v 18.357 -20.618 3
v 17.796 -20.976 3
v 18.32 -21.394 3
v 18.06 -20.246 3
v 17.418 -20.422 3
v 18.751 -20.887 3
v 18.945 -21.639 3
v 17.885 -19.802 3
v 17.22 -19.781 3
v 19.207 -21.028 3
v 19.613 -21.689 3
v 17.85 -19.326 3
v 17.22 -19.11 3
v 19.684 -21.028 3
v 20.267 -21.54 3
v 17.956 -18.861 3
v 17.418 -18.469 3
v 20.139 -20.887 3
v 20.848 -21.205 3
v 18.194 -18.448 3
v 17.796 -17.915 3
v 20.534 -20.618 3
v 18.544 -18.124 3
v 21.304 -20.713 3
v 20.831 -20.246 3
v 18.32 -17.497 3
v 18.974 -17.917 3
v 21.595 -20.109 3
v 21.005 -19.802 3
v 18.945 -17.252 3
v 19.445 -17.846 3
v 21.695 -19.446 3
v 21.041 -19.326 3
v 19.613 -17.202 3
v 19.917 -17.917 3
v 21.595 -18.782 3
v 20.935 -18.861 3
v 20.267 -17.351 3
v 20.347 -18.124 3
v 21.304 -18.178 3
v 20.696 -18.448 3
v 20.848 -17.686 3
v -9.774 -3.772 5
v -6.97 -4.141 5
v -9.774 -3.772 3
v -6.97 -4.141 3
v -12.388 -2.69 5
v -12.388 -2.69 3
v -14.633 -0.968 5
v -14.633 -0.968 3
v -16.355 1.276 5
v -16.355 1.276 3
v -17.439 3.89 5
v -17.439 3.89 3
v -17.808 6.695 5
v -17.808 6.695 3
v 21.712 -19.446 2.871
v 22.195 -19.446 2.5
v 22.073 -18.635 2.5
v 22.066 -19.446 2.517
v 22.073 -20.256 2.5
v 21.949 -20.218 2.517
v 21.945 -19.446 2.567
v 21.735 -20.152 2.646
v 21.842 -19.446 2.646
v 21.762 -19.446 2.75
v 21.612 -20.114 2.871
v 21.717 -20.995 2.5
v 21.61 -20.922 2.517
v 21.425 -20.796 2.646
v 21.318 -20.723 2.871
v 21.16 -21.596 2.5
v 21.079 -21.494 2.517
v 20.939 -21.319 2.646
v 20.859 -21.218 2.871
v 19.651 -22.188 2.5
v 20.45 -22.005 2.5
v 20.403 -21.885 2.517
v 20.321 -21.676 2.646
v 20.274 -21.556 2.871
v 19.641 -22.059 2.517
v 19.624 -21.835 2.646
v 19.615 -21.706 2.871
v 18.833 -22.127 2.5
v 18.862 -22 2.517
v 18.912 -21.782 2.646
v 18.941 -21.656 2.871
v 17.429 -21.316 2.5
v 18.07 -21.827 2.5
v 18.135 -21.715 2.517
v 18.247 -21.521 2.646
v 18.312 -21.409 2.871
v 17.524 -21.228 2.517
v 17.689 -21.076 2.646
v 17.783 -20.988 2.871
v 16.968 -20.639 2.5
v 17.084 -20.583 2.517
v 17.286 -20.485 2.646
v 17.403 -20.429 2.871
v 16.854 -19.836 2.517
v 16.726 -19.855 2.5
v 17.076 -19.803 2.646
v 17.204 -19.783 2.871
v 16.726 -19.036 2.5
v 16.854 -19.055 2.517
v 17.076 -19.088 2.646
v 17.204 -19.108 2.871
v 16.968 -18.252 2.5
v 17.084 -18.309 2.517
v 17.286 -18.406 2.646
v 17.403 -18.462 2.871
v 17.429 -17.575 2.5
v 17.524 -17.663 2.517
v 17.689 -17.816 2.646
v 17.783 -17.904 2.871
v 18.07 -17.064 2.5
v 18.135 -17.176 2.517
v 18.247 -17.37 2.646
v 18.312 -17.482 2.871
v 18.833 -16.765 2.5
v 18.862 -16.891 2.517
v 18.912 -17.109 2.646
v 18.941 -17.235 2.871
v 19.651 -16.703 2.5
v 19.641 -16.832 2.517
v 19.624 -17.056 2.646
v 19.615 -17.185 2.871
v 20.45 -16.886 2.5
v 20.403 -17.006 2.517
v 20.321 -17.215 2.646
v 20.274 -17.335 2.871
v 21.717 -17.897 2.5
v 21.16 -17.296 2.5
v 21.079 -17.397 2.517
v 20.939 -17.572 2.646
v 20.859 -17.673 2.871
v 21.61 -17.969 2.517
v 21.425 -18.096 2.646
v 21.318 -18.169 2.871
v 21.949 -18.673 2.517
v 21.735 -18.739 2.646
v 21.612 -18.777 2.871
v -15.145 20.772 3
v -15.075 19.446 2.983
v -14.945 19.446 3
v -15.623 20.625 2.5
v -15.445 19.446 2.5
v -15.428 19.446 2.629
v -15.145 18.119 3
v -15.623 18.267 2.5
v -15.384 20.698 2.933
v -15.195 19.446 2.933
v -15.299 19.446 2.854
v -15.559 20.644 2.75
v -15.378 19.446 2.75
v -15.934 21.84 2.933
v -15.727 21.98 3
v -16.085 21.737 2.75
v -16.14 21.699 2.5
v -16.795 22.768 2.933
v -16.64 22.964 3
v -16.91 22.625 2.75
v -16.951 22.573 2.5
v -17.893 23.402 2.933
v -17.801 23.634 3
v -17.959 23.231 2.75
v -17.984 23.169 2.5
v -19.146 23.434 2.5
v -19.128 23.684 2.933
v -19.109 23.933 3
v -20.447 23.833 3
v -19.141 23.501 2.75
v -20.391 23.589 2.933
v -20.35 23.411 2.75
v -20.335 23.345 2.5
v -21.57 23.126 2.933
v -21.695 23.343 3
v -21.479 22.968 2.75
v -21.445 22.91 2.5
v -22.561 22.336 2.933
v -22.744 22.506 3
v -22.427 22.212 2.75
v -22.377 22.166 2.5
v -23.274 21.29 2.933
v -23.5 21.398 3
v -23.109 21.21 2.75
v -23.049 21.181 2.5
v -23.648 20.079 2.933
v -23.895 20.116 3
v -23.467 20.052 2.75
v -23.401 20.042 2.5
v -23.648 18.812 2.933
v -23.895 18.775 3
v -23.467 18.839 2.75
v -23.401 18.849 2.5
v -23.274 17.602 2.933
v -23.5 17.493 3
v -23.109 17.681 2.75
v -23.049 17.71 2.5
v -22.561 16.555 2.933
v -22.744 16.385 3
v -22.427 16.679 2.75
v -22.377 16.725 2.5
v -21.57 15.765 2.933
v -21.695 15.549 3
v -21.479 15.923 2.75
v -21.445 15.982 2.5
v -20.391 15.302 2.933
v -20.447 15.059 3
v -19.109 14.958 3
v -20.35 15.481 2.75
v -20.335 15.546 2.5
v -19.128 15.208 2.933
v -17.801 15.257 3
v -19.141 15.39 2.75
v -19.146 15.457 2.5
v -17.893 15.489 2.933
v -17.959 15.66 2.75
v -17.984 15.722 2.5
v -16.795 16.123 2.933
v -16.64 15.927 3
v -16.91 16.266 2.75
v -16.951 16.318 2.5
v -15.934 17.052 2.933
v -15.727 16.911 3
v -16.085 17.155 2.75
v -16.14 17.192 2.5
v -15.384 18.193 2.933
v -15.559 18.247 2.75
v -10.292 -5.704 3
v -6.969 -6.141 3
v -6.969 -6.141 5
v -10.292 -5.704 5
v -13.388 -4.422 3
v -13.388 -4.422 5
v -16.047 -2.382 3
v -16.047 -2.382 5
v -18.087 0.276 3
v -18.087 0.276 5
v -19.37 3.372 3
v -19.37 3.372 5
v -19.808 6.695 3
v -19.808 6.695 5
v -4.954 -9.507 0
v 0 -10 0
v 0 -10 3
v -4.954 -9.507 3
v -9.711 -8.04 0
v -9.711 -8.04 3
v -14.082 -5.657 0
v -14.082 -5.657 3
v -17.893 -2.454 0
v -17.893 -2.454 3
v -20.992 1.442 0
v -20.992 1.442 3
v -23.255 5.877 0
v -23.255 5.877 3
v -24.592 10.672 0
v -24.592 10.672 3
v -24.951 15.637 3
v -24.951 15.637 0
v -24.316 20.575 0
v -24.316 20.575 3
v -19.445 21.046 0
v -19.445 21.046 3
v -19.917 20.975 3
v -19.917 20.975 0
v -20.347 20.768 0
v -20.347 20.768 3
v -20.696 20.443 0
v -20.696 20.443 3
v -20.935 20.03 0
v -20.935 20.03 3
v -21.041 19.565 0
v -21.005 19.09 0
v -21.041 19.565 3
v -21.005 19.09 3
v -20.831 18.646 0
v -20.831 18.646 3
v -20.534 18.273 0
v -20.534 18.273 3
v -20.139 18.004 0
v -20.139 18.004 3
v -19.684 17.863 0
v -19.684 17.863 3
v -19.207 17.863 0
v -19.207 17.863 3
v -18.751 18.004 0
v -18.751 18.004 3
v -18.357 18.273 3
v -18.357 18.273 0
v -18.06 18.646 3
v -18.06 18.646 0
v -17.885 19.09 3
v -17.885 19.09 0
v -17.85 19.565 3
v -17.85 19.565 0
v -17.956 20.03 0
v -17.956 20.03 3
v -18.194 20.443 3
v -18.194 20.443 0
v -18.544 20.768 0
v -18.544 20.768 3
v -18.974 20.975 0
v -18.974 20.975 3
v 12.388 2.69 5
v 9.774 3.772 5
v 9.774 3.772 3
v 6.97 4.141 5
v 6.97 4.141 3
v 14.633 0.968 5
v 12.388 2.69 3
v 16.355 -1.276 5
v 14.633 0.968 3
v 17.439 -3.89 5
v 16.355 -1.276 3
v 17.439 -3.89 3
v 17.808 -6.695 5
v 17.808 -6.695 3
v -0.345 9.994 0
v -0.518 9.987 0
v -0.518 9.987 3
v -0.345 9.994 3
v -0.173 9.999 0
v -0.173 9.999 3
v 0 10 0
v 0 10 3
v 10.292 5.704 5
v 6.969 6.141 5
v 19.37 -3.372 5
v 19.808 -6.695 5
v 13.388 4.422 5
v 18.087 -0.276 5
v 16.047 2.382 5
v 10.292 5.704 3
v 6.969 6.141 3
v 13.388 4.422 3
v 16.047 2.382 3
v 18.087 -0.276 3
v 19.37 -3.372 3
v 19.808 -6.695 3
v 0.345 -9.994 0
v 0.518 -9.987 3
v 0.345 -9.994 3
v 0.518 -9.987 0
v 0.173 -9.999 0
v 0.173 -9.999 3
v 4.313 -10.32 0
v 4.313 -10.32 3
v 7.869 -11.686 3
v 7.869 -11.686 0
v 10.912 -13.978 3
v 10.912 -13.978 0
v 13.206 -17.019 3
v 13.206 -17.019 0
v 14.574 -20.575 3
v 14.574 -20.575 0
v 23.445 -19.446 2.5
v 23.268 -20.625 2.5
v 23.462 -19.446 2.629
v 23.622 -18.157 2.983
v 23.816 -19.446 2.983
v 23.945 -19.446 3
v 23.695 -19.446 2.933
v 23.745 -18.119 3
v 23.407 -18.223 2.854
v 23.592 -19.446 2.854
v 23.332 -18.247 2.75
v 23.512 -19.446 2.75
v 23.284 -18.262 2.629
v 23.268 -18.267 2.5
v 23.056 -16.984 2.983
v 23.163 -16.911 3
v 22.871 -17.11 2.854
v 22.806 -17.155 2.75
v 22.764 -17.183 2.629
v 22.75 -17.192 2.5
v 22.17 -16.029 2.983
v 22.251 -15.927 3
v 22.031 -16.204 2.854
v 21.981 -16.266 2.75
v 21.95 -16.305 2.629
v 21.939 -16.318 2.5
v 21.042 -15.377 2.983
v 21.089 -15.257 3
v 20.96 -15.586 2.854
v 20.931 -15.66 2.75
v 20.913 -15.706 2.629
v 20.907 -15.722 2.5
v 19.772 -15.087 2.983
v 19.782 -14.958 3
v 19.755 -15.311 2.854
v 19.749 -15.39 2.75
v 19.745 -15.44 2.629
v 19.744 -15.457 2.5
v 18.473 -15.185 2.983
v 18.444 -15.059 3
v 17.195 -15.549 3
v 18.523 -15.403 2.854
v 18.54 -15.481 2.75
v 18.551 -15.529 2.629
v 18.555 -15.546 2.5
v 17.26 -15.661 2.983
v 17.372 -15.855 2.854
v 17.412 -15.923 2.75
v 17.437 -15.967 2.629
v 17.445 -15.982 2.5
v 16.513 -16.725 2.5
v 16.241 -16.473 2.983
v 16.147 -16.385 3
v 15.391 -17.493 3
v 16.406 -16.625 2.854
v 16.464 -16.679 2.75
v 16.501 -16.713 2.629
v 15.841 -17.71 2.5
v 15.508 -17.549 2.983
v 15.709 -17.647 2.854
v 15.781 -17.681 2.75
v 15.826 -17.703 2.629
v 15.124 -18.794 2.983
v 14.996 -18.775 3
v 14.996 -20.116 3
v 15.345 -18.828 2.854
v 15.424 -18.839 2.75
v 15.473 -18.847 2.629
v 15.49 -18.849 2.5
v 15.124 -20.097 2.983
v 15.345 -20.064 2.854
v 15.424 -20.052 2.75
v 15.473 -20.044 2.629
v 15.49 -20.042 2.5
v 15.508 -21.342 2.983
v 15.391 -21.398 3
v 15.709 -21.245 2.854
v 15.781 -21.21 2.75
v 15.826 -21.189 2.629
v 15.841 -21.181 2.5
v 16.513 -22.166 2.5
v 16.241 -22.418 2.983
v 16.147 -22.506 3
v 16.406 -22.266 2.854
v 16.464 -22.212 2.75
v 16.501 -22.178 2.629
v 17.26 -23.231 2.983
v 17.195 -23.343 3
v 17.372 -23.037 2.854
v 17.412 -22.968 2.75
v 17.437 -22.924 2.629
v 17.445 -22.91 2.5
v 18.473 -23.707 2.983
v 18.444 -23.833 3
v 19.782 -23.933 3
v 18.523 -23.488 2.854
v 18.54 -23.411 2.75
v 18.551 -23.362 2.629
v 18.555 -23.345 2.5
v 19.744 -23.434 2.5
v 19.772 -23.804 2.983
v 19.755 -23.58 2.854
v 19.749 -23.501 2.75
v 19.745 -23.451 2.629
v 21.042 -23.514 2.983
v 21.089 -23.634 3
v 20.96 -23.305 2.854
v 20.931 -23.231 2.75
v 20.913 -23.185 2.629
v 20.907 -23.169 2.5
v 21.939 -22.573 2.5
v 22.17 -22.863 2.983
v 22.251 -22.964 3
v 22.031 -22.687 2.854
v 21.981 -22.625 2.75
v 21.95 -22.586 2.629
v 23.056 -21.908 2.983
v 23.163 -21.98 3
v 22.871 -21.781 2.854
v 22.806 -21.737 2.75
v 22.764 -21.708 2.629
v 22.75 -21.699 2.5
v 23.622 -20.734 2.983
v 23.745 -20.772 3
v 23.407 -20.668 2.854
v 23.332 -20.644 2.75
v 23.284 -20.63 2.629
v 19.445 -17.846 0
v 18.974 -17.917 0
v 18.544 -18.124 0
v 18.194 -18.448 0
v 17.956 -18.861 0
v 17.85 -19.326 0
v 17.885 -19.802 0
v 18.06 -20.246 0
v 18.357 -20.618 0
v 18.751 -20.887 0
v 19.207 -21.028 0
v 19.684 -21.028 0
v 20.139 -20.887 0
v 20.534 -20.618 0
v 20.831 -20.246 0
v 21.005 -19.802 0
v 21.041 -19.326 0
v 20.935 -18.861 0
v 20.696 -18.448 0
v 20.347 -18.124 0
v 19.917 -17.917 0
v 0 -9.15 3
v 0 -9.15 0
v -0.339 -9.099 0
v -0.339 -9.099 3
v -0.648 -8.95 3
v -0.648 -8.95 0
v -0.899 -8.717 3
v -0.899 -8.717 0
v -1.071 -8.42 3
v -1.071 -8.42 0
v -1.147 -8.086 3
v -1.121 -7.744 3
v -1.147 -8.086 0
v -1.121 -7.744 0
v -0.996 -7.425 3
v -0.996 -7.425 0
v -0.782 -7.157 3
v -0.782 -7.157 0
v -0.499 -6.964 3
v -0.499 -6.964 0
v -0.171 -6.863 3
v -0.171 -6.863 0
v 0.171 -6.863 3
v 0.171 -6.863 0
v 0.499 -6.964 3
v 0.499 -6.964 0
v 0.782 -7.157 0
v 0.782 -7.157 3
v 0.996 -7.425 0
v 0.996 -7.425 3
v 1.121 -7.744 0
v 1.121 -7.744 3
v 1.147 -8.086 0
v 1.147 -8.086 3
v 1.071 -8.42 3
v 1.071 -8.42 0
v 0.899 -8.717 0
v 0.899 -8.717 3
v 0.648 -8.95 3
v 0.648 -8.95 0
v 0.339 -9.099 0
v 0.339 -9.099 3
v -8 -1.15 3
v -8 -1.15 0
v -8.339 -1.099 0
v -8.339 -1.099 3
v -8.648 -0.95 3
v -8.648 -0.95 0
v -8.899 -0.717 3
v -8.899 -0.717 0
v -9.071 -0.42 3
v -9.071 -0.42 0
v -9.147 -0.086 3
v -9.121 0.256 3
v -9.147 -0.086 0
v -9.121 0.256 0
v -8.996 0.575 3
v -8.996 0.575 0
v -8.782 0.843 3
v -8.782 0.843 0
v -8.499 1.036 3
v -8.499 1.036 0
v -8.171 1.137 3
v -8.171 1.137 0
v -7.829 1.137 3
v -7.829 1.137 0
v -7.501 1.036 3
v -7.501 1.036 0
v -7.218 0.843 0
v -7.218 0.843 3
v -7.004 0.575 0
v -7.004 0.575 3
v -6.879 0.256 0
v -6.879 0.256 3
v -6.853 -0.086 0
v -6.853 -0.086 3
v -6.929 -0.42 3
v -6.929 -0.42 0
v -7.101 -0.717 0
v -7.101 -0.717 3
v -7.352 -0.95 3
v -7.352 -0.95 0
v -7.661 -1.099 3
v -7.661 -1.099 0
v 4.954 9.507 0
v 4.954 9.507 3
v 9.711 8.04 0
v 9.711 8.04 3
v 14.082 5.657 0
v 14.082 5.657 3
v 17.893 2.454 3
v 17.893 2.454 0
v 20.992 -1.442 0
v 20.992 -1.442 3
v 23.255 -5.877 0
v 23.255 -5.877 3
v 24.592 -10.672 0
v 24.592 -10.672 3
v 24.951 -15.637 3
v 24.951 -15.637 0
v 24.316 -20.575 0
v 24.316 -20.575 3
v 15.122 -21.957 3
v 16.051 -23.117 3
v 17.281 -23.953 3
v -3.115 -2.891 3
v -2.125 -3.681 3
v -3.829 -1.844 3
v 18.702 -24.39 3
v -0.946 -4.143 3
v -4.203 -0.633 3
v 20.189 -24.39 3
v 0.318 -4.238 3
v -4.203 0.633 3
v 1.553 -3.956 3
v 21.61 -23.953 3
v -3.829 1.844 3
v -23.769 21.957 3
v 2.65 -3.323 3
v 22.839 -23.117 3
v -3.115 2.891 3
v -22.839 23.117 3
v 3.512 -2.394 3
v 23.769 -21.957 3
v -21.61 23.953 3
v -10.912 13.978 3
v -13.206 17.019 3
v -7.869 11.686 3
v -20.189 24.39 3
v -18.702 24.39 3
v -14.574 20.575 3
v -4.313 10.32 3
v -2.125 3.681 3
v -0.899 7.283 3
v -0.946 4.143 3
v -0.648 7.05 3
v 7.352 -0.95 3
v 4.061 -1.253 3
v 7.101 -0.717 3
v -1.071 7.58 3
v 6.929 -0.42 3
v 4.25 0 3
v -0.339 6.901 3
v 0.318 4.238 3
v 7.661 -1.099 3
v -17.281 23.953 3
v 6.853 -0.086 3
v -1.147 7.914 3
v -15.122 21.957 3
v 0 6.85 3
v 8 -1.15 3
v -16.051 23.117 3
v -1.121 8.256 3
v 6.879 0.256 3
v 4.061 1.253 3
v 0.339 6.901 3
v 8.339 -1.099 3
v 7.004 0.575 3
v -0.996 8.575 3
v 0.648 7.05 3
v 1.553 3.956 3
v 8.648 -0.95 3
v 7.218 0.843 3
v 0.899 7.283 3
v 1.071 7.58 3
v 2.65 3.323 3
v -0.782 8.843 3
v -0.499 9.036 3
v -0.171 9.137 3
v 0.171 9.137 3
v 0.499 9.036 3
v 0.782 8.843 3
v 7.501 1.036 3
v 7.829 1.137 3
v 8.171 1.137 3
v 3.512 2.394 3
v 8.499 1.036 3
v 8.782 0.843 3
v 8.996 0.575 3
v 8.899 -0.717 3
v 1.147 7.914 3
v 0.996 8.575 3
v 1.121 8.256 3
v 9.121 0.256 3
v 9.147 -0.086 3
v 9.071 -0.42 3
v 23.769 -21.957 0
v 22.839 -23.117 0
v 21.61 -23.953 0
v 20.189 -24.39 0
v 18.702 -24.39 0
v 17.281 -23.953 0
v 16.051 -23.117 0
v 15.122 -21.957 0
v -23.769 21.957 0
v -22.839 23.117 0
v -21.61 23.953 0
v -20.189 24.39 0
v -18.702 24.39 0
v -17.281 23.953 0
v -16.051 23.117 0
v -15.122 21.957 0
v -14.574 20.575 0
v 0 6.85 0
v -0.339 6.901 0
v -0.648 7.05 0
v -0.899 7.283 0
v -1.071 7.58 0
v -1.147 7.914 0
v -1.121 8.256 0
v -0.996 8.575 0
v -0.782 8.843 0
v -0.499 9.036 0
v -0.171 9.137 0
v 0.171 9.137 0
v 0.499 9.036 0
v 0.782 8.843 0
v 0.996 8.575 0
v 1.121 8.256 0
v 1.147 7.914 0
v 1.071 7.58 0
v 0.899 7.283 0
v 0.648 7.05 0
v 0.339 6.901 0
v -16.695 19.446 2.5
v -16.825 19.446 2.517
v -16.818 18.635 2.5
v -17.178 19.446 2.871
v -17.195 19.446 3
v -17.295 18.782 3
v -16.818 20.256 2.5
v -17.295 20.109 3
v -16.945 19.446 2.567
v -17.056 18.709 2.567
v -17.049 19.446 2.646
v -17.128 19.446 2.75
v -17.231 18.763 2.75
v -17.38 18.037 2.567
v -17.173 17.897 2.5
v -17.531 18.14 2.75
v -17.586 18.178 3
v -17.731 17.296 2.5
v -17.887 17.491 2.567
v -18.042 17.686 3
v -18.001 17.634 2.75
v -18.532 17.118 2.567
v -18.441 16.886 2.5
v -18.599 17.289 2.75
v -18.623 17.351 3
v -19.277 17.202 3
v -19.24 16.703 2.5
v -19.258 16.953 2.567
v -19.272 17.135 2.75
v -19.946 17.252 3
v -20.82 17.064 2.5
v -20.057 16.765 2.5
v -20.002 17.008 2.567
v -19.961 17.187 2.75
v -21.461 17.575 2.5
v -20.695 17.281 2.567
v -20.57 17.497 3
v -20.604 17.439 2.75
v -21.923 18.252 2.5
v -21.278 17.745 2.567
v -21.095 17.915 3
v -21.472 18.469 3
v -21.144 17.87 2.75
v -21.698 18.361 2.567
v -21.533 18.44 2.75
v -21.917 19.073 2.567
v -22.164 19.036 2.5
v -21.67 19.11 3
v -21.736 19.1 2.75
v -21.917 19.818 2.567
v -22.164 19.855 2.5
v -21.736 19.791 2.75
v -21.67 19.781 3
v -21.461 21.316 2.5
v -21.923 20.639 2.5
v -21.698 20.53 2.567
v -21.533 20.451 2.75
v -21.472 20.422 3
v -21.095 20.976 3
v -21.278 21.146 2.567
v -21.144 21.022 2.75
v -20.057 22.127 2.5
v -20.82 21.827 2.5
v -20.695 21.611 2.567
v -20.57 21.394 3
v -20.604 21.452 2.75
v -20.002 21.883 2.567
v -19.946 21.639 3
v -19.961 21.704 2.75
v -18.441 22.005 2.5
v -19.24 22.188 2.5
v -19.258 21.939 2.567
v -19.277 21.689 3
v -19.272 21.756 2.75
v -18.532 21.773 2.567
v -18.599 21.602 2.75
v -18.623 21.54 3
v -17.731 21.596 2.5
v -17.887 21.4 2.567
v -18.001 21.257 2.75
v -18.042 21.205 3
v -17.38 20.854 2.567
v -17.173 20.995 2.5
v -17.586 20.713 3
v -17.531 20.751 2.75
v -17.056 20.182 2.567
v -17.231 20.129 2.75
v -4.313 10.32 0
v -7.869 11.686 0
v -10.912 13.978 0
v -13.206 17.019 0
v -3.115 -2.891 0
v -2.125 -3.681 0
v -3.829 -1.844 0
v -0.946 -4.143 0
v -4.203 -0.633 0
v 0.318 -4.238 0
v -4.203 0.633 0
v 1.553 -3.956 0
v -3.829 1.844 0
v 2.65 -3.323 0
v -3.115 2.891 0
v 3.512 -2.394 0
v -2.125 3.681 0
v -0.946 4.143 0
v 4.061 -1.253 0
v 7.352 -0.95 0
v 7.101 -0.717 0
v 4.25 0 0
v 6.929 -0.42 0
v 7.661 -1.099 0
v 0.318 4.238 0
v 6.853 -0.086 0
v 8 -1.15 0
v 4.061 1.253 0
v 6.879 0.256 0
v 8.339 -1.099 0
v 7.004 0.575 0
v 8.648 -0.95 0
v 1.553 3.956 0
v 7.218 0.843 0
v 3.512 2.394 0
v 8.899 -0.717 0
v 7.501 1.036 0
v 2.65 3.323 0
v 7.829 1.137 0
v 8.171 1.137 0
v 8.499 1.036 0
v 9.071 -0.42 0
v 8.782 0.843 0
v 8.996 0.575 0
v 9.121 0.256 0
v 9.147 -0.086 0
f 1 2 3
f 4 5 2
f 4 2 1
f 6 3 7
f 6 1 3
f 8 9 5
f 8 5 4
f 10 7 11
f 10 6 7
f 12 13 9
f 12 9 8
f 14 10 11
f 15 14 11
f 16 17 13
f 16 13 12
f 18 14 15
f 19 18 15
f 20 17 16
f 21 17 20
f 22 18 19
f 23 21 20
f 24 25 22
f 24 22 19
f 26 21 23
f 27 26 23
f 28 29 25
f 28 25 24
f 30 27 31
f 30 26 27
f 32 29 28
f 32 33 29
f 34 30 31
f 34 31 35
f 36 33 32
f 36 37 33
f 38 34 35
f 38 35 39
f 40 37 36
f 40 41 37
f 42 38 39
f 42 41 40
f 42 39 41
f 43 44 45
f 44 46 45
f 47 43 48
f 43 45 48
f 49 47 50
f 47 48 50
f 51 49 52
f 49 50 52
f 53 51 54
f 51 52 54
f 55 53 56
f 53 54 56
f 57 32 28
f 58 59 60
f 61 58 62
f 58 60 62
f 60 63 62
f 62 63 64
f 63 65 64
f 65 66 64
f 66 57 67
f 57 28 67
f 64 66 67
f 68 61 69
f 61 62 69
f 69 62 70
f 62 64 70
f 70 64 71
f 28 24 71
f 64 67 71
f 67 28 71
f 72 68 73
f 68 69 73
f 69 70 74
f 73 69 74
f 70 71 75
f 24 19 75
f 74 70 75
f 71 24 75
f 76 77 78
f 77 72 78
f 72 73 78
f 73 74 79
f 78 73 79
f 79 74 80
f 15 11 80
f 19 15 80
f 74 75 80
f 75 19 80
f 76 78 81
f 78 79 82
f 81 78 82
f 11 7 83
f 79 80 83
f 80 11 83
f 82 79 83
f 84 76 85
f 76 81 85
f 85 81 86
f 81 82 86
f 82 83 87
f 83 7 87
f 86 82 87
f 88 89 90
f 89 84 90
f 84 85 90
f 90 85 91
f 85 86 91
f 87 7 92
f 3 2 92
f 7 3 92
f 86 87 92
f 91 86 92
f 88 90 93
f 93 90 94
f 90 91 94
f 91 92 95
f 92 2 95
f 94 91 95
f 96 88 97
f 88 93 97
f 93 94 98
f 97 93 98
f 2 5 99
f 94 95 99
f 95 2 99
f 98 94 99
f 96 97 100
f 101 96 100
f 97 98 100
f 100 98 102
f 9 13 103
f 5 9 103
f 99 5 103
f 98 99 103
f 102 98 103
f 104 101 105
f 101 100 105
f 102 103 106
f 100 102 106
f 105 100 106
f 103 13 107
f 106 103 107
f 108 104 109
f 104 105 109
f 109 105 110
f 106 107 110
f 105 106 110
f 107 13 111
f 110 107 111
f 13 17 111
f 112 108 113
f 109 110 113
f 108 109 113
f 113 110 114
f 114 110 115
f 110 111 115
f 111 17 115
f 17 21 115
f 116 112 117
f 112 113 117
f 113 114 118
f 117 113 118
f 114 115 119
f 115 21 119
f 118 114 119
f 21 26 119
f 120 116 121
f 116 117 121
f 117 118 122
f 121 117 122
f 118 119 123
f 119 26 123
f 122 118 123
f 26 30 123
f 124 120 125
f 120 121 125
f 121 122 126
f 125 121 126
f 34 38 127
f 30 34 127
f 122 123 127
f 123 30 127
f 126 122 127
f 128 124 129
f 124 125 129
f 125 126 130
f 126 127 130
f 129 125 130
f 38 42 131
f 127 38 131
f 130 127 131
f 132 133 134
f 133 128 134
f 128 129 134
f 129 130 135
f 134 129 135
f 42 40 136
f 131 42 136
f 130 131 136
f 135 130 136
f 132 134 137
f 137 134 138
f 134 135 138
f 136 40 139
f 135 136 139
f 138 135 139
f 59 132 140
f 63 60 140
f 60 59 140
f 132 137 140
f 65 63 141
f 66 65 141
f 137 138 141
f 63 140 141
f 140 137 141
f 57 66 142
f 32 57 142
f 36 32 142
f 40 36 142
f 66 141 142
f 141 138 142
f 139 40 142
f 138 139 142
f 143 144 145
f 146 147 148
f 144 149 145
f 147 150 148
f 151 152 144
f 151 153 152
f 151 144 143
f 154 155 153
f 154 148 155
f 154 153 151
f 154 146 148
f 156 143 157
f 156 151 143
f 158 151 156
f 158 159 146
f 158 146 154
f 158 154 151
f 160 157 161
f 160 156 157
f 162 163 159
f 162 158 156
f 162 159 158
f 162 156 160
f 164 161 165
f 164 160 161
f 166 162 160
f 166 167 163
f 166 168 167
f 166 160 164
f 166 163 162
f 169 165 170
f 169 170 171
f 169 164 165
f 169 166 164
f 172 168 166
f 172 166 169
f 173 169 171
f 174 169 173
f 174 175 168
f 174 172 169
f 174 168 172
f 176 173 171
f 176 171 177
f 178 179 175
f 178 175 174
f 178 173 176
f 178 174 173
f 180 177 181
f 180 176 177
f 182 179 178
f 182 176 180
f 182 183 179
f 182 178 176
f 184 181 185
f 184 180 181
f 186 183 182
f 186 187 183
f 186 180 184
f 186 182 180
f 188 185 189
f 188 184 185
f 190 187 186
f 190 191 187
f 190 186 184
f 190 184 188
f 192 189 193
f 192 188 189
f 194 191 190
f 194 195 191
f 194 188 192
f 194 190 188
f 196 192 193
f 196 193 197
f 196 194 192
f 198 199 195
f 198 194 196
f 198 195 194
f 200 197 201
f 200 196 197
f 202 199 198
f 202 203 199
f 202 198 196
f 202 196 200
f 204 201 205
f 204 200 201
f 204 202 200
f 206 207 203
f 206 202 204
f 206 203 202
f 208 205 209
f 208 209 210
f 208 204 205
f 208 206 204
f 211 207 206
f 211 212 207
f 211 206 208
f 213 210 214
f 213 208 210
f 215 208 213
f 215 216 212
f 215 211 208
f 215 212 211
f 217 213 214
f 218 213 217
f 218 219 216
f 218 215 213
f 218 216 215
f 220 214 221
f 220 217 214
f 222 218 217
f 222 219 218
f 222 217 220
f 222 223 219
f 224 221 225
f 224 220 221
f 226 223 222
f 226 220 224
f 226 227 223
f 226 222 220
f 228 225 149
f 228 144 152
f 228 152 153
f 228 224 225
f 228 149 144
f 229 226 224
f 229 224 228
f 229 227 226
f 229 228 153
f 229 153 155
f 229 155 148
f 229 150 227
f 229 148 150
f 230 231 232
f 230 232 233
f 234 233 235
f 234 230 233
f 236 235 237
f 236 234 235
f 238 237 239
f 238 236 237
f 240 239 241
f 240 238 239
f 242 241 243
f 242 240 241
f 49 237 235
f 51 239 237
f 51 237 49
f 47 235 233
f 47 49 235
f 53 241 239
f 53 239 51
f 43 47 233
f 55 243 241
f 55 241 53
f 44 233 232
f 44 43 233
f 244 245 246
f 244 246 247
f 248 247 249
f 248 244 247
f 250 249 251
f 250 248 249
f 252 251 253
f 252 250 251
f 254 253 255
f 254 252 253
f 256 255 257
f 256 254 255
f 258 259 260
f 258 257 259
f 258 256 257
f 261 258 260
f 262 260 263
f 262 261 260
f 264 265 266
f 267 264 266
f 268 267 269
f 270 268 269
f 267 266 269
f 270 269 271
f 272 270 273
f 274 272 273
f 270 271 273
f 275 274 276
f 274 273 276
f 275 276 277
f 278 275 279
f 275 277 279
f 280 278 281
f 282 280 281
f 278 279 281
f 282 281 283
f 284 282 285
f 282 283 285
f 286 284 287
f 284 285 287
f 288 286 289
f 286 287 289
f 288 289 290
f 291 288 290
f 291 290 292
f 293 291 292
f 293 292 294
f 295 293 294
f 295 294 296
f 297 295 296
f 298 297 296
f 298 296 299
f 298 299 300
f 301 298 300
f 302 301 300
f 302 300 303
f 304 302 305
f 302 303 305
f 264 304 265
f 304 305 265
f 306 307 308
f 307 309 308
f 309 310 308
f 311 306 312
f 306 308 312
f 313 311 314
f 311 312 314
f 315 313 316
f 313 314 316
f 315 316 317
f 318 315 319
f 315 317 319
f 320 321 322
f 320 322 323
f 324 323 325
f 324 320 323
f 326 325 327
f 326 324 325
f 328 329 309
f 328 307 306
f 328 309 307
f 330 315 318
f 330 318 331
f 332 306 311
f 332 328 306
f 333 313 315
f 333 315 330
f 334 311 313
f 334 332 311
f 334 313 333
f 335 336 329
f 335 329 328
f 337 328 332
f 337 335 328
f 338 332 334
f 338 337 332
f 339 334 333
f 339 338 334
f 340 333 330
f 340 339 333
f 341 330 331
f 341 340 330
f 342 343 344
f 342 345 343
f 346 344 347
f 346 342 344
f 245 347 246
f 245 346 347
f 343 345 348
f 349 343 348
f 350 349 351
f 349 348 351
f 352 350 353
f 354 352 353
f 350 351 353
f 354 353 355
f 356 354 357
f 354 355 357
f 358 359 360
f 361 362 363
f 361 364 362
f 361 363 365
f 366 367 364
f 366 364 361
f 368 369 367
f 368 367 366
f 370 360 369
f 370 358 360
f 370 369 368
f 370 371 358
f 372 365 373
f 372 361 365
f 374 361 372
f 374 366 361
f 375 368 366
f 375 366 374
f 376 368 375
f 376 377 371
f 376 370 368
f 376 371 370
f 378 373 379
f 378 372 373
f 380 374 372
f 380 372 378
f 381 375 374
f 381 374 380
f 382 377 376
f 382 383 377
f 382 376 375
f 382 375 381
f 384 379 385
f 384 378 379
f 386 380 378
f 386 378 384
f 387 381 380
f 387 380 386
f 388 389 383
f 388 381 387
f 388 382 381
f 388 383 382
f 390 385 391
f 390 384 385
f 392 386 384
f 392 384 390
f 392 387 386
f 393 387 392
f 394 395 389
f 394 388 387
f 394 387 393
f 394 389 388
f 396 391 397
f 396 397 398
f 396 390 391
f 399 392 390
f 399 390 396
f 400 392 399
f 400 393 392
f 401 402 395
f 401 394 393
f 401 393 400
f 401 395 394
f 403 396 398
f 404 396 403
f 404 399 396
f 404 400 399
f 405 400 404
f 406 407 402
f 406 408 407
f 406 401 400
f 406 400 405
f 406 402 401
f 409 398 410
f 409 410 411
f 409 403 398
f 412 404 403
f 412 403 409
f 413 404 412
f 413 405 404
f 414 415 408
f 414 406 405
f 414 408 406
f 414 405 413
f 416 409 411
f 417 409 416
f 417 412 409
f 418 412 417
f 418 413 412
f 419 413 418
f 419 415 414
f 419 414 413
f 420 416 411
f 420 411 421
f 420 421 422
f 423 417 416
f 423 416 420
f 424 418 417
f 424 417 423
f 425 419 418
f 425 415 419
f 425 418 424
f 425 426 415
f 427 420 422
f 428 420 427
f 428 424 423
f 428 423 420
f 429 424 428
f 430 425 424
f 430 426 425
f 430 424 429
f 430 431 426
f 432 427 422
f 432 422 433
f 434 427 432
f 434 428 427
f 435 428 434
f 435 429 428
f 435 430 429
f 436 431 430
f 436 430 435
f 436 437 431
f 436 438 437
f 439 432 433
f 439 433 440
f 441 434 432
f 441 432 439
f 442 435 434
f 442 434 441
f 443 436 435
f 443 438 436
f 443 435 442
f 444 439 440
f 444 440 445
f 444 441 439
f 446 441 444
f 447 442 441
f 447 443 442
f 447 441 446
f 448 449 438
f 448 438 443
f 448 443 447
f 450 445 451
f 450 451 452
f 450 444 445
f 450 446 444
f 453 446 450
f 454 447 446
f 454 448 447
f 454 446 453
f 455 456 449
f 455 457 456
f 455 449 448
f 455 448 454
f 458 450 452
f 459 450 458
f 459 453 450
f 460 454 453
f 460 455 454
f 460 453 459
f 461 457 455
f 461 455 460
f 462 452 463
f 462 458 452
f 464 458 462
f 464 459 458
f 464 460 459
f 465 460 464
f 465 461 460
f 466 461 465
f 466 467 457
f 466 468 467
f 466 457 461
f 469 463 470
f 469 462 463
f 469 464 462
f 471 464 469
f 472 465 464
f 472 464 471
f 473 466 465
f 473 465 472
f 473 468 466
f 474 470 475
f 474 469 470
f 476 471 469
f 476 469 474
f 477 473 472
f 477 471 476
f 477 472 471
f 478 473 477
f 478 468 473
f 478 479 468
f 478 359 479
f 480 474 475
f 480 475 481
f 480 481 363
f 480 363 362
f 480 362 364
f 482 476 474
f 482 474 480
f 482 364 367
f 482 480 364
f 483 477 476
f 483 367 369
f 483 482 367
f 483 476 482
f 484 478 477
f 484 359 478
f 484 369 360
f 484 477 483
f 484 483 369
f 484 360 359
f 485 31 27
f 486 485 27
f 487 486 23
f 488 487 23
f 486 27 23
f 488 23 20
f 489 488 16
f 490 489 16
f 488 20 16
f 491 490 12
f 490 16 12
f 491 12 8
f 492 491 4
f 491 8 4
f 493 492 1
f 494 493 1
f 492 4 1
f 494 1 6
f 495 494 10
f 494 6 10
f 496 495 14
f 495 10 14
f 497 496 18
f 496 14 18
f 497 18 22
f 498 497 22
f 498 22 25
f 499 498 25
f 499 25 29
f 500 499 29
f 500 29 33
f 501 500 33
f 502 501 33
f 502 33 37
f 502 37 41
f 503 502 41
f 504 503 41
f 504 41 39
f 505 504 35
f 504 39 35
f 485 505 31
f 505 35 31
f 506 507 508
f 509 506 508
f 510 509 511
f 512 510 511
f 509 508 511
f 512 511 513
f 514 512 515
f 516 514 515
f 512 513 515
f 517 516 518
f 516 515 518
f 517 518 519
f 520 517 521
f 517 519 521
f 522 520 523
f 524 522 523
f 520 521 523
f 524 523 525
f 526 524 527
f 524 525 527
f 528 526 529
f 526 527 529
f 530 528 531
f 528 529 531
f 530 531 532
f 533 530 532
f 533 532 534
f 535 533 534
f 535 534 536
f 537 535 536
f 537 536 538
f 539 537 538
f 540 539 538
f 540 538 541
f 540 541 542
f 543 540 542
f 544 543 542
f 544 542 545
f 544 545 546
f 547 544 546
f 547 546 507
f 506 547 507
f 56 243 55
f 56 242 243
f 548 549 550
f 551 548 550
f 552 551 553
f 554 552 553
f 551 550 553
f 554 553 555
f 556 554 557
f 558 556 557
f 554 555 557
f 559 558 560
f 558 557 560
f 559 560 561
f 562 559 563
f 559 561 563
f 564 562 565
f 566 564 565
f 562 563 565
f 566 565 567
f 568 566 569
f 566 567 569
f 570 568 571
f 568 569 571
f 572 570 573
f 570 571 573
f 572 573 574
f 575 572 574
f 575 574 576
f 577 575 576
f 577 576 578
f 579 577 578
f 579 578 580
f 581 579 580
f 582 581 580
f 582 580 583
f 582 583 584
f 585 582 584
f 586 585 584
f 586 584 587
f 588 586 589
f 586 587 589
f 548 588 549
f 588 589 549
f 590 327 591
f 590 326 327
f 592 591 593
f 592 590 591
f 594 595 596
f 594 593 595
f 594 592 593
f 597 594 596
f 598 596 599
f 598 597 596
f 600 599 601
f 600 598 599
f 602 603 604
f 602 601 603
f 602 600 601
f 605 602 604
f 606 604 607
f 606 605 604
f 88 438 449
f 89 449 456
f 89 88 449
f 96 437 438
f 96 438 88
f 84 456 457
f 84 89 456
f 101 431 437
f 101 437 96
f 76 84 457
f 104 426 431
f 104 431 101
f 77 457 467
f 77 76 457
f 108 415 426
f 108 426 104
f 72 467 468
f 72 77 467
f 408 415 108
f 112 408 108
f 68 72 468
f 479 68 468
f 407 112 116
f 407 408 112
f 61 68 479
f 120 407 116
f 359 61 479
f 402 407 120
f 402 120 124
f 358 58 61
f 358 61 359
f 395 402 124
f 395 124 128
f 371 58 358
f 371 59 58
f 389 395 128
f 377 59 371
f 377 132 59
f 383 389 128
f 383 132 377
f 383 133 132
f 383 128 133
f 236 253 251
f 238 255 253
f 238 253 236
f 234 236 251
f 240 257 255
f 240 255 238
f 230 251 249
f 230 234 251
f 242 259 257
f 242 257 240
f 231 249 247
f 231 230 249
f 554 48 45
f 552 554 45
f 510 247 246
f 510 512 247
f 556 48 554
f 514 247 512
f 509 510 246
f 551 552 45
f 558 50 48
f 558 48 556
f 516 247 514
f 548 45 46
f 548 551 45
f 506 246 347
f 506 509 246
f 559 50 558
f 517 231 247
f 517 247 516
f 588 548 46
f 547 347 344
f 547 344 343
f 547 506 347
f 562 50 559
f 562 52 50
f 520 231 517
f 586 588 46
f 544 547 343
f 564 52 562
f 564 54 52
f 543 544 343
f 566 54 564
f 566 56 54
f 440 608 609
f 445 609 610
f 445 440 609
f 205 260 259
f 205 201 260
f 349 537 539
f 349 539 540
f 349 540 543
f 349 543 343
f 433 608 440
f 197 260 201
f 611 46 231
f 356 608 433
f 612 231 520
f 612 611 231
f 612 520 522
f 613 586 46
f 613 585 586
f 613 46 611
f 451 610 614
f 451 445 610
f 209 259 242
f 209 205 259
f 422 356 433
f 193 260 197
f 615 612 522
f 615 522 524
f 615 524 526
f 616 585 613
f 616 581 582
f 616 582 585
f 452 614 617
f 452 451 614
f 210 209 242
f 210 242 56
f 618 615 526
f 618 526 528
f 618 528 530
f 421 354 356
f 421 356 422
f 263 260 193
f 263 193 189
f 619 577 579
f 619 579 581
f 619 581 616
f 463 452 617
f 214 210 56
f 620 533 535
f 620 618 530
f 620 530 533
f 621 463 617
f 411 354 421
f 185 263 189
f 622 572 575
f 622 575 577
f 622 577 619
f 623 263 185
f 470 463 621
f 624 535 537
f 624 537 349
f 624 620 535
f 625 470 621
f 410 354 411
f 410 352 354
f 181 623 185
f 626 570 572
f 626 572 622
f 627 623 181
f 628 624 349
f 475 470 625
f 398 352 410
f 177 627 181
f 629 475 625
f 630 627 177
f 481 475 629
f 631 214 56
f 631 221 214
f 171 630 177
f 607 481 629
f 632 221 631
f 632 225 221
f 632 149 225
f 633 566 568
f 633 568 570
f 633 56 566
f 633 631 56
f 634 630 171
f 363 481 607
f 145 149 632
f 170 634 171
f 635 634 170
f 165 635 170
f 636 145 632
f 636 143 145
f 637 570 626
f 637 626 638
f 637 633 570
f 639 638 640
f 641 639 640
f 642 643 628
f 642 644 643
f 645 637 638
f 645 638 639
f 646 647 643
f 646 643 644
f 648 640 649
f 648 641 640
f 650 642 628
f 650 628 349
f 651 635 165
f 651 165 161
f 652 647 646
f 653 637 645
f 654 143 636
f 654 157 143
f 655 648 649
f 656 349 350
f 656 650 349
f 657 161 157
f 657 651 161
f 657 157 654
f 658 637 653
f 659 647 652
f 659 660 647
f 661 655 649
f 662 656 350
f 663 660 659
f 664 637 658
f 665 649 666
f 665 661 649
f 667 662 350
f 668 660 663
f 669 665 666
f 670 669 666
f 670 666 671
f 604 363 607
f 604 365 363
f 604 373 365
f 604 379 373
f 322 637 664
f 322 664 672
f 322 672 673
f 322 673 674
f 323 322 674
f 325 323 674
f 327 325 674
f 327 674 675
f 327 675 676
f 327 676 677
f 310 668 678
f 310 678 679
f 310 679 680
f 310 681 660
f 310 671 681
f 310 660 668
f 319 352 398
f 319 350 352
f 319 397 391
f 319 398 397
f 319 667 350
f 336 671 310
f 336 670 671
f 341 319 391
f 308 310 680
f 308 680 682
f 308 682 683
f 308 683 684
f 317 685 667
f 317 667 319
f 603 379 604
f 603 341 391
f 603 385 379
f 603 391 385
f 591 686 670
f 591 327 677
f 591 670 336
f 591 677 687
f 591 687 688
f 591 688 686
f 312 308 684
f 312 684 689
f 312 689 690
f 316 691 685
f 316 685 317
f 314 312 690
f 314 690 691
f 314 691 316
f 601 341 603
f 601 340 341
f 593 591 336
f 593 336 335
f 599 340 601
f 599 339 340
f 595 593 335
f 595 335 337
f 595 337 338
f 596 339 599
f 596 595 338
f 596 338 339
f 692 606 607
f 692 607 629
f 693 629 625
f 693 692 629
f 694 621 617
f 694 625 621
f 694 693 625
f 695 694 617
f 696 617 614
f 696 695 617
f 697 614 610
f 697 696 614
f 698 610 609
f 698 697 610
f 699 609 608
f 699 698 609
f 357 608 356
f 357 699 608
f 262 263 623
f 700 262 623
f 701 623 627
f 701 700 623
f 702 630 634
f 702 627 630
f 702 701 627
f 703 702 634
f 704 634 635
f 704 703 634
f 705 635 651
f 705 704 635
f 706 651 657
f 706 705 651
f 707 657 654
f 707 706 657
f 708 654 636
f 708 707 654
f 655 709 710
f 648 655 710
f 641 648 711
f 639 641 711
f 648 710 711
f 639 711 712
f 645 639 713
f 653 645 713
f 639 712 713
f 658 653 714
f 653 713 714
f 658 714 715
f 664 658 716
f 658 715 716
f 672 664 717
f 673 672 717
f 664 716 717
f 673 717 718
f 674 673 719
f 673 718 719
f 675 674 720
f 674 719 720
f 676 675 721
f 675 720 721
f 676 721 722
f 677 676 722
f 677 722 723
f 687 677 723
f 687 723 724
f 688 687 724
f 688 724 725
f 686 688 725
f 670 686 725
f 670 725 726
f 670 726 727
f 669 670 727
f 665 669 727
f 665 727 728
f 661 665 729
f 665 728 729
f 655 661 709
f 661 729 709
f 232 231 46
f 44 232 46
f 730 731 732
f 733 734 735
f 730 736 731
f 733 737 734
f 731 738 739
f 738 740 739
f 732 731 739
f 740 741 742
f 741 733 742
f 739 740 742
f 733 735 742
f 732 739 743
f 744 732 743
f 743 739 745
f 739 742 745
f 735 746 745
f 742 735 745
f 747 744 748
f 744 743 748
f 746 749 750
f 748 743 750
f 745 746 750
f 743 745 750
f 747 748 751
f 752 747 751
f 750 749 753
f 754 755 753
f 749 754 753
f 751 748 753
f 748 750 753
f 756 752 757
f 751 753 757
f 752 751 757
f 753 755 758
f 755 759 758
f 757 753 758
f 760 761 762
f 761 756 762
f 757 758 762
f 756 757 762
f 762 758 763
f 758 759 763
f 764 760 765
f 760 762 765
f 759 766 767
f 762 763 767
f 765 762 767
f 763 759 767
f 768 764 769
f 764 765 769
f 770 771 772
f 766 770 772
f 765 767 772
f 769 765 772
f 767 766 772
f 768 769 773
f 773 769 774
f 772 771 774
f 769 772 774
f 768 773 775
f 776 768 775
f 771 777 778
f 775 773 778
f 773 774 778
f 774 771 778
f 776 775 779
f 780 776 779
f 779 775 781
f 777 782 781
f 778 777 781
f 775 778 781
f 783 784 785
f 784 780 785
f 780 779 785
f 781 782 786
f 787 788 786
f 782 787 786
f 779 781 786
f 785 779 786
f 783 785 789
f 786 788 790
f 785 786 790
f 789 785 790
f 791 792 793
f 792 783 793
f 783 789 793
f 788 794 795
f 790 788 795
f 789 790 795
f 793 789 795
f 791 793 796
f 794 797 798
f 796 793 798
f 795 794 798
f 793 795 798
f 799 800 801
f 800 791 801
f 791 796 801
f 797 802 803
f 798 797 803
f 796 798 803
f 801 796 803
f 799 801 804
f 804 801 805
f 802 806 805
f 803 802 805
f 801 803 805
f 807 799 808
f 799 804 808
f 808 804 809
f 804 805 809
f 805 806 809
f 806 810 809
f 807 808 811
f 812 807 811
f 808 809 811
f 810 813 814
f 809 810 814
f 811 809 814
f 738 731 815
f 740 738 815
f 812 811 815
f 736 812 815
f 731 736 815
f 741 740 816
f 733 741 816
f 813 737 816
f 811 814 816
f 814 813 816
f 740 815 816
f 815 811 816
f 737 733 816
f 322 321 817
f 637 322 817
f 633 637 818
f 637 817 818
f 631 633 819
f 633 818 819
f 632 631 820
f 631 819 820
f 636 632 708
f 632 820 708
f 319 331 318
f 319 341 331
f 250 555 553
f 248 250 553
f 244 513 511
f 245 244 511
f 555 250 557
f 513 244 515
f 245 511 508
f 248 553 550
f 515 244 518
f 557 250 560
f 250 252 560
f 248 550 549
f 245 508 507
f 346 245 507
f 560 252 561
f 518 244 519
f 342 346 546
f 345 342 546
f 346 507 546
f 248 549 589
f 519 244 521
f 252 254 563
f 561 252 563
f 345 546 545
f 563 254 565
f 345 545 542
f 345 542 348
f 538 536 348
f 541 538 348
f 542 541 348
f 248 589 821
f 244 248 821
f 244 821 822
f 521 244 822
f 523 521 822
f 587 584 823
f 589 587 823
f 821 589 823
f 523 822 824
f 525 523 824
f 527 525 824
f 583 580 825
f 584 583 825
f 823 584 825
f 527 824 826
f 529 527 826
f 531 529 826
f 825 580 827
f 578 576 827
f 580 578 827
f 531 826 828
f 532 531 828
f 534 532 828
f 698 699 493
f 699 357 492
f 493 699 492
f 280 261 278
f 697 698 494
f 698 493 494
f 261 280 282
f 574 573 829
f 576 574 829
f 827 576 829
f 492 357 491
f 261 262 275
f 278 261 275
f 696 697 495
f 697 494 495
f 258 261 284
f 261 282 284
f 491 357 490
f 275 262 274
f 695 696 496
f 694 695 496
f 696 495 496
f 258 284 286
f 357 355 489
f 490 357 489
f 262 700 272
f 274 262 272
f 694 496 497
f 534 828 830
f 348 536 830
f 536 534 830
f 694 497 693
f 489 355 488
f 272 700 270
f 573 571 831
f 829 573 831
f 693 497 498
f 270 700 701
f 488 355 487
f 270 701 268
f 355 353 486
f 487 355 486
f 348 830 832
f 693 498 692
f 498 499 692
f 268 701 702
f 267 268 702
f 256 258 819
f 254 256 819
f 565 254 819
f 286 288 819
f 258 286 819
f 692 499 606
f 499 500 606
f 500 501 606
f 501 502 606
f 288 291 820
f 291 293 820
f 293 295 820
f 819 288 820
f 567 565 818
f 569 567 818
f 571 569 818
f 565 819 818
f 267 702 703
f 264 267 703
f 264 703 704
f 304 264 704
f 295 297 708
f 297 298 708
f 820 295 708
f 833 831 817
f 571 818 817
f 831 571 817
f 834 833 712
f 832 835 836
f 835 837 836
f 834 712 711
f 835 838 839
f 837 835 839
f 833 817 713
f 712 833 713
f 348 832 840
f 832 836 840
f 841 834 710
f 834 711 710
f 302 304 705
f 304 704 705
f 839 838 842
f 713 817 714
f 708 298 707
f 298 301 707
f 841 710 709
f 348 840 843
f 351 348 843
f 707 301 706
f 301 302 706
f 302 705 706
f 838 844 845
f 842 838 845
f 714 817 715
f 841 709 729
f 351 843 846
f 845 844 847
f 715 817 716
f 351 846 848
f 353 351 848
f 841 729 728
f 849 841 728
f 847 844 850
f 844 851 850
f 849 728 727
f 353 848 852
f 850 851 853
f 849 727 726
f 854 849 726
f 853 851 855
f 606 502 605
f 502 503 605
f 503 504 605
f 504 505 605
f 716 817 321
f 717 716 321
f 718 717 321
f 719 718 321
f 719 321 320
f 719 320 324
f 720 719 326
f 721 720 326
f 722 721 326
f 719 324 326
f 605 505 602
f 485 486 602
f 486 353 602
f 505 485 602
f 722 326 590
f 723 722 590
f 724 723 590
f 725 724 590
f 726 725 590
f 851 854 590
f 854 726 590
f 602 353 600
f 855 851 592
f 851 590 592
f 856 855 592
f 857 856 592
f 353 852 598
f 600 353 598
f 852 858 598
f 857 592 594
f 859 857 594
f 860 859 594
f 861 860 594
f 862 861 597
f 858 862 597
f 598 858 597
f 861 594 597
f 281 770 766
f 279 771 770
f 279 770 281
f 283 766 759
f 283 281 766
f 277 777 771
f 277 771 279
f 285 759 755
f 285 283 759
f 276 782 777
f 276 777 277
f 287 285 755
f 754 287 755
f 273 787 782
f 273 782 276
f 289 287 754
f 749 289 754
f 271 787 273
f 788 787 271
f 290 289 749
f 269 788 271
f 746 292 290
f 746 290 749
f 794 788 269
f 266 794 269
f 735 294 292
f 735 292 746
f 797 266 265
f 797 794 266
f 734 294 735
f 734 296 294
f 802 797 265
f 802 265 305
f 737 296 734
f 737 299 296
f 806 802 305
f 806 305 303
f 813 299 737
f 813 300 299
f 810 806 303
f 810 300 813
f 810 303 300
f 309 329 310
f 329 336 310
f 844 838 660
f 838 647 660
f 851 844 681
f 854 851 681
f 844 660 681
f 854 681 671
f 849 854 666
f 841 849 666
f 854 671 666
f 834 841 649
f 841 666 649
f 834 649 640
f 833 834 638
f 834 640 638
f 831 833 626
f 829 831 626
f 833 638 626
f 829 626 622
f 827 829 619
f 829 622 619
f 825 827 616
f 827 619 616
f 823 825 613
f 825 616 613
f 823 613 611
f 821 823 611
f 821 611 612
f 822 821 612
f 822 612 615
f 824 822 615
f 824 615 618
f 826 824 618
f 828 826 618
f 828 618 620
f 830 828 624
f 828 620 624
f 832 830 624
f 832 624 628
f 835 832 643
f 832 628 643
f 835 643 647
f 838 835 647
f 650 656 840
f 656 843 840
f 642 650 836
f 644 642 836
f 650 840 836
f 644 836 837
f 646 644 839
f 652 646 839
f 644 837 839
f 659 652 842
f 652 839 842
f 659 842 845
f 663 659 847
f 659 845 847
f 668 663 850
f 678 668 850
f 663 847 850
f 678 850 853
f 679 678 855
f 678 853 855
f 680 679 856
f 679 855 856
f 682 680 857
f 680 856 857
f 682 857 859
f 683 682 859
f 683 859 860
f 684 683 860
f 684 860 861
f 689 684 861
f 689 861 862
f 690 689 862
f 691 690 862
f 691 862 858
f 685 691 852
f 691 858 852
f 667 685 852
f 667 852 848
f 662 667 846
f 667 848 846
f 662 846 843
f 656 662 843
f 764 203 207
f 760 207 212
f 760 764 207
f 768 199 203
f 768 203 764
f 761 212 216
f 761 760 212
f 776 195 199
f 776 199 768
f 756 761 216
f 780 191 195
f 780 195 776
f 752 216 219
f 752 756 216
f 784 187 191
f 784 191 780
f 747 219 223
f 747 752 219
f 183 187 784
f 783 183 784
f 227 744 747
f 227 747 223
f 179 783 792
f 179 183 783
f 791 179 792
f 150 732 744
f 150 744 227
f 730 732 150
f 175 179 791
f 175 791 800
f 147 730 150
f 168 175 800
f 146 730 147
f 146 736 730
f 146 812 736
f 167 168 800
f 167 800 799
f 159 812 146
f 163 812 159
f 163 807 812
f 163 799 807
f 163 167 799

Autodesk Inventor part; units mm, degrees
ref_plane "YZ Plane" through (0, 0, 0) normal (1, 0, 0) x (0, 1, 0)
ref_plane "XZ Plane" through (0, 0, 0) normal (0, 1, 0) x (-1, 0, 0)
ref_plane "XY Plane" through (0, 0, 0) normal (0, 0, 1) x (1, 0, 0)
sketch "スケッチ1" plane through (0, 0, 0) normal (0, 0, 1) x (1, 0, 0)
  circle A0 centre (0, 0) radius 27.5
  line L0 (0, 27.5) -> (0, 0)
  line L1 (8, 0) -> (19.445271, -19.445602)
  line L2 (0, 0) -> (27.5, 0)
  circle A1 centre (19.445271, -19.445602) radius 5
  circle A2 centre (0, 0) radius 10
  arc A3 (24.316088, -20.574825) -> (0, 10.000005) centre (0.018653, -14.941839) ccw
  line L3 (24.316088, -20.574825) -> (14.574455, -20.574825)
  arc A4 (14.574455, -20.574825) -> (0.517924, -9.986579) centre (1.227526, -23.669106) ccw
  arc A5 (-24.316088, 20.574825) -> (0, -10.000005) centre (-0.018653, 14.941839) ccw
  arc A6 (-14.574455, 20.574825) -> (-0.517924, 9.986579) centre (-1.227526, 23.669106) ccw
  circle A7 centre (-19.445271, 19.445602) radius 5
  point P0 (-0.517924, 9.986579)
  point P1 (0, -10)
  point P2 (0, 10.000005)
  dimension "d4" = 20
  dimension "d0" = 55
  dimension "d1" = 8
  dimension "d2" = 22.56381
  dimension "d3" = 10
  dimension "d5" = 9.74163
  dimension "d9" = 360
sketch "スケッチ1 outline for 押し出し1" plane through (0, 0, 0) normal (0, 0, 1) x (1, 0, 0)
  arc A0 (14.574455, -20.574825) -> (24.316088, -20.574825) centre (19.445271, -19.445602) ccw
  arc A1 (24.316088, -20.574825) -> (0, 10.000005) centre (0.018653, -14.941839) ccw
  arc A2 (0, 10) -> (-0.517924, 9.986579) centre (0, 0) ccw
  arc A3 (-0.517924, 9.986579) -> (-14.574455, 20.574825) centre (-1.227526, 23.669106) cw
  arc A4 (-14.574455, 20.574825) -> (-24.316088, 20.574825) centre (-19.445271, 19.445602) ccw
  arc A5 (-24.316088, 20.574825) -> (0, -10) centre (-0.018659, 14.941837) ccw
  arc A6 (0, -10) -> (0.517924, -9.986579) centre (0, 0) ccw
  arc A7 (0.517924, -9.986579) -> (14.574455, -20.574825) centre (1.227526, -23.669106) cw
extrude "押し出し1" add sketch "スケッチ1 outline for 押し出し1" along normal blind 3
sketch "スケッチ2" plane through (0, 0, 3) normal (0, 0, 1) x (1, 0, 0)
  circle A0 centre (0, 0) radius 4.25
  dimension "d13" = 8.5
extrude "押し出し2" cut sketch "スケッチ2" against normal blind 3
sketch "スケッチ3" plane through (0, 0, 3) normal (0, 0, 1) x (1, 0, 0)
  arc A0 (-14.574455, 20.574825) -> (-24.316088, 20.574825) centre (-19.445271, 19.445602) ccw
  arc A1 (14.574455, -20.574825) -> (24.316088, -20.574825) centre (19.445271, -19.445602) ccw
  circle A2 centre (0, 0) radius 4.25
  point P0 (8, 0)
  point P1 (-8, 0)
  point P2 (0, 8)
  point P3 (-8, 0)
  point P4 (0, -8)
  dimension "d16" = 8
  dimension "d17" = 8
  dimension "d49" = 360
hole "穴1" at (-19.445271, 19.445602, 3) at (19.445271, -19.445602, 3) at (8, 0, 3) at (-8, 0, 3) at (0, 8, 3) at (0, -8, 3) direction (0, 0, -1) diameter 2.3 end through all
sketch "スケッチ4" plane through (0, 0, 3) normal (0, 0, 1) x (1, 0, 0)
  circle A0 centre (0, 0) radius 9.289
  circle A1 centre (8, 0) radius 1.15
  circle A2 centre (8, 0) radius 6.227
  circle A3 centre (0, 0) radius 8.107
  circle A4 centre (8, 0) radius 4.267399
  line L0 (6.969375, 6.141119) -> (6.969547, 4.141119)
  circle A5 centre (6.970301, -6.696881) radius 12.838
  circle A6 centre (0, 0) radius 20.909
  circle A7 centre (8, 0) radius 13.574
  line L1 (19.8083, -6.694589) -> (17.8083, -6.694761)
  arc A8 (17.8083, -6.694761) -> (6.969547, 4.141119) centre (6.970301, -6.696881) ccw
  circle A9 centre (-6.970301, 6.696881) radius 12.838
  line L2 (-19.8083, 6.694589) -> (-17.8083, 6.694761)
  arc A10 (-17.8083, 6.694761) -> (-6.969547, -4.141119) centre (-6.970301, 6.696881) ccw
  line L3 (-6.969375, -6.141119) -> (-6.969547, -4.141119)
  point P0 (6.969547, 4.141119)
  point P1 (-6.969547, -4.141119)
  dimension "d25" = 18.578
  dimension "d26" = 12.454
  dimension "d30" = 41.818
  dimension "d31" = 27.148
  dimension "d27" = 16.214
  dimension "d29" = 25.676
  dimension "d32" = 2
  dimension "d33" = 2
  dimension "d36" = 360
extrude "押し出し3" add sketch "スケッチ4" along normal blind 2 contours A8 A4 A0 | A0 A4 A8 | A4 L0 A0 | A0 A5 A2 A8 A4 | A2 A5 L1 A8 | A9 L2 A10 A0 | A0 A10 L3 picked at (7.717949, 4.165451) picked at (9.179473, 4.022297)
sketch "スケッチ5" plane through (0, 0, 0) normal (0, 0, -1) x (-1, 0, 0)
  circle A0 centre (19.445271, 19.445602) radius 1.15
  circle A1 centre (-19.445271, -19.445602) radius 1.15
  point P0 (0, 0)
hole "穴2" at (-19.445271, 19.445602, 0) at (19.445271, -19.445602, 0) direction (0, 0, 1) diameter 3.2 end through all
sketch "スケッチ6" plane through (0, 0, 3) normal (0, 0, 1) x (1, 0, 0)
  circle A0 centre (-19.445271, 19.445602) radius 1.6
  circle A1 centre (-19.445271, 19.445602) radius 2.25
  circle A2 centre (-19.445271, 19.445602) radius 4
  circle A3 centre (19.445271, -19.445602) radius 1.6
  circle A4 centre (19.445271, -19.445602) radius 2.25
  circle A5 centre (19.445271, -19.445602) radius 4
  point P0 (0, 0)
  dimension "d51" = 4.5
  dimension "d52" = 8
  dimension "d53" = 4.5
  dimension "d54" = 8
extrude "押し出し4" cut sketch "スケッチ6" against normal blind 0.5 contours A2 | A5
fillet "フィレット1" radius 0.5 4 edges at (-21.6953, 19.4456, 2.5) (17.1953, -19.4456, 2.5) (-23.4453, 19.4456, 3) (15.4453, -19.4456, 3)
properties part number "rotor_ver2" material "アルミニウム 6061"
